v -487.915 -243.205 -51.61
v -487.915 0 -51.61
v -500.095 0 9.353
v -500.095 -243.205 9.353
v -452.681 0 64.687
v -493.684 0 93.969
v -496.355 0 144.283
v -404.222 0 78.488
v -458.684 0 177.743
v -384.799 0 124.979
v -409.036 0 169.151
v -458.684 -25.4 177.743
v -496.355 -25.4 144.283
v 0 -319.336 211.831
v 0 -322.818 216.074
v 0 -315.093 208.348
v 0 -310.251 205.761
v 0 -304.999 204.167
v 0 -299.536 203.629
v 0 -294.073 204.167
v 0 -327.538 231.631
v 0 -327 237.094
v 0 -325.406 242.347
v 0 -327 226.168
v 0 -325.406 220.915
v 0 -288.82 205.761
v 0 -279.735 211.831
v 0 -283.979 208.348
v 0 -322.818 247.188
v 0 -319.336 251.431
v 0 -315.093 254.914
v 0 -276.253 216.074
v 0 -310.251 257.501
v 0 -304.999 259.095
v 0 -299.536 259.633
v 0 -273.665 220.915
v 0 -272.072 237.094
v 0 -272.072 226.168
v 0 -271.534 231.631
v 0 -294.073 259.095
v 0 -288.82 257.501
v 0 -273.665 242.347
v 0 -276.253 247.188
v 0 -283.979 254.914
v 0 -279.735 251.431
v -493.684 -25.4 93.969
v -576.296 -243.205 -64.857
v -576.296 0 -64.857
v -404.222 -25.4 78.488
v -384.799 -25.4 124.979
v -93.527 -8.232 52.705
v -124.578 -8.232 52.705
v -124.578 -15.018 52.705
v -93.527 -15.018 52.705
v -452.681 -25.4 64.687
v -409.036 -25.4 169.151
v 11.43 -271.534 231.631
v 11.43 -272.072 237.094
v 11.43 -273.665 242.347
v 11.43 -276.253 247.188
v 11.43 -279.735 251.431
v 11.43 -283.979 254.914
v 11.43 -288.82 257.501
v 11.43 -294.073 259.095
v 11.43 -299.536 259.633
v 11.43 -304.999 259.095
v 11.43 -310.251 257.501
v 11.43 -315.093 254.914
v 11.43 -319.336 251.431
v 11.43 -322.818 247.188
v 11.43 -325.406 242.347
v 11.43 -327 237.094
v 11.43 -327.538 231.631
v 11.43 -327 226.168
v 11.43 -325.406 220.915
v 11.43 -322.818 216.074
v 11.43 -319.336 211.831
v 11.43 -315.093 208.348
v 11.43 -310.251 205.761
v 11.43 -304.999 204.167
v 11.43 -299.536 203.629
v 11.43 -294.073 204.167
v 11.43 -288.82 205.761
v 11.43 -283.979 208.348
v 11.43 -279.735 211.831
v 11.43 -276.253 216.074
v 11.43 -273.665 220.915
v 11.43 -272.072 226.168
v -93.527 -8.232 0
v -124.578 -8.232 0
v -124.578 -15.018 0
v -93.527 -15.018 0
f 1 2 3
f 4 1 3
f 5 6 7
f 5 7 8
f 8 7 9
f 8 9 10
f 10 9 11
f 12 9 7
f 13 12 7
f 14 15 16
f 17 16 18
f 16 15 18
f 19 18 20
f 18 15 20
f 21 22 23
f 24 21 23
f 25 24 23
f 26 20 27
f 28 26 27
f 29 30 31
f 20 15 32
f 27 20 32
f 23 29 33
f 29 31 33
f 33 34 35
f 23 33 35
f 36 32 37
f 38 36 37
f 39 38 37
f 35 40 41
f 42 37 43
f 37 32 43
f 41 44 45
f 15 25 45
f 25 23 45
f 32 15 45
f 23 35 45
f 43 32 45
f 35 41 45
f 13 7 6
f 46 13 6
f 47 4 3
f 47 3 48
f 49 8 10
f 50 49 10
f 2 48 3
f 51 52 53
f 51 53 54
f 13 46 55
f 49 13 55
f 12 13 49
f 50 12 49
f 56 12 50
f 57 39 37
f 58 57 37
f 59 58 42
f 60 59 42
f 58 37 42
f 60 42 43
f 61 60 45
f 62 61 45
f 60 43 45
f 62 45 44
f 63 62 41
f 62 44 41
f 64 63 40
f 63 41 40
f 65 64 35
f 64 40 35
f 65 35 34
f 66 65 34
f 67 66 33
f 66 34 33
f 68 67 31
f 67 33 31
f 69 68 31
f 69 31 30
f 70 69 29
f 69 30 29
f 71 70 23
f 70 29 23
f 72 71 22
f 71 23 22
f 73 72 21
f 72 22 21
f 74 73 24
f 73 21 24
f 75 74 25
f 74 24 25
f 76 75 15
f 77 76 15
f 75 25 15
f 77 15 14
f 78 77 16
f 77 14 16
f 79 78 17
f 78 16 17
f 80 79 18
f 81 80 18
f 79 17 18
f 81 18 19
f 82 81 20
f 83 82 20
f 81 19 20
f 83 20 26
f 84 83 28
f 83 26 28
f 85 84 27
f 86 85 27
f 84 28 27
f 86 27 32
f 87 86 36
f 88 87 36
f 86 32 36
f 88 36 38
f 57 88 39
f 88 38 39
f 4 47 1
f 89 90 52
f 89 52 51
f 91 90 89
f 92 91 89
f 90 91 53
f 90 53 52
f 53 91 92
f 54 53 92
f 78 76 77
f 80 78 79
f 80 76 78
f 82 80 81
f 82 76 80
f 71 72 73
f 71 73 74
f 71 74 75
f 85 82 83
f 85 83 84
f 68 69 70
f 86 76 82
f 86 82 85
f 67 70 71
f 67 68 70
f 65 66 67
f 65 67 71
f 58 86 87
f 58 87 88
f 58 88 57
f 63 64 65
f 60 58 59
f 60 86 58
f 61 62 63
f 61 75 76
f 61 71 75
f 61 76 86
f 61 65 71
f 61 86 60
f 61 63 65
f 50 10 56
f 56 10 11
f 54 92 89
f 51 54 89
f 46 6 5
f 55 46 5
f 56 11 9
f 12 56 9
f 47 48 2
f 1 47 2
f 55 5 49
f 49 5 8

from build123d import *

# Parameters (mm, degrees)
F0_W     = 31.050824
F0_H     = 6.786614
F1_DEPTH = 52.705
F2_R     = 28.001981
F3_DEPTH = 11.43
F5_DEPTH = 243.205
F7_DEPTH = 25.4


with BuildPart() as f1:
    # F0 (on Top) → F1 (new body)
    with BuildSketch(Plane.XY):
        with Locations((-109.052617, -11.624923)):
            Rectangle(F0_W, F0_H)
    extrude(amount=F1_DEPTH)


with BuildPart() as f3:
    # F2 (on Right) → F3 (new body)
    with BuildSketch(Plane.YZ):
        with Locations((-299.535602, 231.630966)):
            Circle(F2_R)
    extrude(amount=F3_DEPTH)


with BuildPart() as f5:
    # F4 (on Front) → F5 (new body)
    with BuildSketch(Plane.XZ):
        Polygon((-500.094712, 9.35286), (-576.296337, -64.856924), (-487.915337, -51.610056), align=None)
    extrude(amount=F5_DEPTH)


with BuildPart() as f7:
    # F6 (on Front) → F7 (new body)
    with BuildSketch(Plane.XZ):
        Polygon((-452.680805, 64.687169), (-404.222391, 78.487748), (-384.798791, 124.978582), (-409.036372, 169.151125), (-458.683742, 177.74255), (-496.355417, 144.28334), (-493.683859, 93.968962), align=None)
    extrude(amount=F7_DEPTH)


solid = Compound([f1.part, f3.part, f5.part, f7.part])
